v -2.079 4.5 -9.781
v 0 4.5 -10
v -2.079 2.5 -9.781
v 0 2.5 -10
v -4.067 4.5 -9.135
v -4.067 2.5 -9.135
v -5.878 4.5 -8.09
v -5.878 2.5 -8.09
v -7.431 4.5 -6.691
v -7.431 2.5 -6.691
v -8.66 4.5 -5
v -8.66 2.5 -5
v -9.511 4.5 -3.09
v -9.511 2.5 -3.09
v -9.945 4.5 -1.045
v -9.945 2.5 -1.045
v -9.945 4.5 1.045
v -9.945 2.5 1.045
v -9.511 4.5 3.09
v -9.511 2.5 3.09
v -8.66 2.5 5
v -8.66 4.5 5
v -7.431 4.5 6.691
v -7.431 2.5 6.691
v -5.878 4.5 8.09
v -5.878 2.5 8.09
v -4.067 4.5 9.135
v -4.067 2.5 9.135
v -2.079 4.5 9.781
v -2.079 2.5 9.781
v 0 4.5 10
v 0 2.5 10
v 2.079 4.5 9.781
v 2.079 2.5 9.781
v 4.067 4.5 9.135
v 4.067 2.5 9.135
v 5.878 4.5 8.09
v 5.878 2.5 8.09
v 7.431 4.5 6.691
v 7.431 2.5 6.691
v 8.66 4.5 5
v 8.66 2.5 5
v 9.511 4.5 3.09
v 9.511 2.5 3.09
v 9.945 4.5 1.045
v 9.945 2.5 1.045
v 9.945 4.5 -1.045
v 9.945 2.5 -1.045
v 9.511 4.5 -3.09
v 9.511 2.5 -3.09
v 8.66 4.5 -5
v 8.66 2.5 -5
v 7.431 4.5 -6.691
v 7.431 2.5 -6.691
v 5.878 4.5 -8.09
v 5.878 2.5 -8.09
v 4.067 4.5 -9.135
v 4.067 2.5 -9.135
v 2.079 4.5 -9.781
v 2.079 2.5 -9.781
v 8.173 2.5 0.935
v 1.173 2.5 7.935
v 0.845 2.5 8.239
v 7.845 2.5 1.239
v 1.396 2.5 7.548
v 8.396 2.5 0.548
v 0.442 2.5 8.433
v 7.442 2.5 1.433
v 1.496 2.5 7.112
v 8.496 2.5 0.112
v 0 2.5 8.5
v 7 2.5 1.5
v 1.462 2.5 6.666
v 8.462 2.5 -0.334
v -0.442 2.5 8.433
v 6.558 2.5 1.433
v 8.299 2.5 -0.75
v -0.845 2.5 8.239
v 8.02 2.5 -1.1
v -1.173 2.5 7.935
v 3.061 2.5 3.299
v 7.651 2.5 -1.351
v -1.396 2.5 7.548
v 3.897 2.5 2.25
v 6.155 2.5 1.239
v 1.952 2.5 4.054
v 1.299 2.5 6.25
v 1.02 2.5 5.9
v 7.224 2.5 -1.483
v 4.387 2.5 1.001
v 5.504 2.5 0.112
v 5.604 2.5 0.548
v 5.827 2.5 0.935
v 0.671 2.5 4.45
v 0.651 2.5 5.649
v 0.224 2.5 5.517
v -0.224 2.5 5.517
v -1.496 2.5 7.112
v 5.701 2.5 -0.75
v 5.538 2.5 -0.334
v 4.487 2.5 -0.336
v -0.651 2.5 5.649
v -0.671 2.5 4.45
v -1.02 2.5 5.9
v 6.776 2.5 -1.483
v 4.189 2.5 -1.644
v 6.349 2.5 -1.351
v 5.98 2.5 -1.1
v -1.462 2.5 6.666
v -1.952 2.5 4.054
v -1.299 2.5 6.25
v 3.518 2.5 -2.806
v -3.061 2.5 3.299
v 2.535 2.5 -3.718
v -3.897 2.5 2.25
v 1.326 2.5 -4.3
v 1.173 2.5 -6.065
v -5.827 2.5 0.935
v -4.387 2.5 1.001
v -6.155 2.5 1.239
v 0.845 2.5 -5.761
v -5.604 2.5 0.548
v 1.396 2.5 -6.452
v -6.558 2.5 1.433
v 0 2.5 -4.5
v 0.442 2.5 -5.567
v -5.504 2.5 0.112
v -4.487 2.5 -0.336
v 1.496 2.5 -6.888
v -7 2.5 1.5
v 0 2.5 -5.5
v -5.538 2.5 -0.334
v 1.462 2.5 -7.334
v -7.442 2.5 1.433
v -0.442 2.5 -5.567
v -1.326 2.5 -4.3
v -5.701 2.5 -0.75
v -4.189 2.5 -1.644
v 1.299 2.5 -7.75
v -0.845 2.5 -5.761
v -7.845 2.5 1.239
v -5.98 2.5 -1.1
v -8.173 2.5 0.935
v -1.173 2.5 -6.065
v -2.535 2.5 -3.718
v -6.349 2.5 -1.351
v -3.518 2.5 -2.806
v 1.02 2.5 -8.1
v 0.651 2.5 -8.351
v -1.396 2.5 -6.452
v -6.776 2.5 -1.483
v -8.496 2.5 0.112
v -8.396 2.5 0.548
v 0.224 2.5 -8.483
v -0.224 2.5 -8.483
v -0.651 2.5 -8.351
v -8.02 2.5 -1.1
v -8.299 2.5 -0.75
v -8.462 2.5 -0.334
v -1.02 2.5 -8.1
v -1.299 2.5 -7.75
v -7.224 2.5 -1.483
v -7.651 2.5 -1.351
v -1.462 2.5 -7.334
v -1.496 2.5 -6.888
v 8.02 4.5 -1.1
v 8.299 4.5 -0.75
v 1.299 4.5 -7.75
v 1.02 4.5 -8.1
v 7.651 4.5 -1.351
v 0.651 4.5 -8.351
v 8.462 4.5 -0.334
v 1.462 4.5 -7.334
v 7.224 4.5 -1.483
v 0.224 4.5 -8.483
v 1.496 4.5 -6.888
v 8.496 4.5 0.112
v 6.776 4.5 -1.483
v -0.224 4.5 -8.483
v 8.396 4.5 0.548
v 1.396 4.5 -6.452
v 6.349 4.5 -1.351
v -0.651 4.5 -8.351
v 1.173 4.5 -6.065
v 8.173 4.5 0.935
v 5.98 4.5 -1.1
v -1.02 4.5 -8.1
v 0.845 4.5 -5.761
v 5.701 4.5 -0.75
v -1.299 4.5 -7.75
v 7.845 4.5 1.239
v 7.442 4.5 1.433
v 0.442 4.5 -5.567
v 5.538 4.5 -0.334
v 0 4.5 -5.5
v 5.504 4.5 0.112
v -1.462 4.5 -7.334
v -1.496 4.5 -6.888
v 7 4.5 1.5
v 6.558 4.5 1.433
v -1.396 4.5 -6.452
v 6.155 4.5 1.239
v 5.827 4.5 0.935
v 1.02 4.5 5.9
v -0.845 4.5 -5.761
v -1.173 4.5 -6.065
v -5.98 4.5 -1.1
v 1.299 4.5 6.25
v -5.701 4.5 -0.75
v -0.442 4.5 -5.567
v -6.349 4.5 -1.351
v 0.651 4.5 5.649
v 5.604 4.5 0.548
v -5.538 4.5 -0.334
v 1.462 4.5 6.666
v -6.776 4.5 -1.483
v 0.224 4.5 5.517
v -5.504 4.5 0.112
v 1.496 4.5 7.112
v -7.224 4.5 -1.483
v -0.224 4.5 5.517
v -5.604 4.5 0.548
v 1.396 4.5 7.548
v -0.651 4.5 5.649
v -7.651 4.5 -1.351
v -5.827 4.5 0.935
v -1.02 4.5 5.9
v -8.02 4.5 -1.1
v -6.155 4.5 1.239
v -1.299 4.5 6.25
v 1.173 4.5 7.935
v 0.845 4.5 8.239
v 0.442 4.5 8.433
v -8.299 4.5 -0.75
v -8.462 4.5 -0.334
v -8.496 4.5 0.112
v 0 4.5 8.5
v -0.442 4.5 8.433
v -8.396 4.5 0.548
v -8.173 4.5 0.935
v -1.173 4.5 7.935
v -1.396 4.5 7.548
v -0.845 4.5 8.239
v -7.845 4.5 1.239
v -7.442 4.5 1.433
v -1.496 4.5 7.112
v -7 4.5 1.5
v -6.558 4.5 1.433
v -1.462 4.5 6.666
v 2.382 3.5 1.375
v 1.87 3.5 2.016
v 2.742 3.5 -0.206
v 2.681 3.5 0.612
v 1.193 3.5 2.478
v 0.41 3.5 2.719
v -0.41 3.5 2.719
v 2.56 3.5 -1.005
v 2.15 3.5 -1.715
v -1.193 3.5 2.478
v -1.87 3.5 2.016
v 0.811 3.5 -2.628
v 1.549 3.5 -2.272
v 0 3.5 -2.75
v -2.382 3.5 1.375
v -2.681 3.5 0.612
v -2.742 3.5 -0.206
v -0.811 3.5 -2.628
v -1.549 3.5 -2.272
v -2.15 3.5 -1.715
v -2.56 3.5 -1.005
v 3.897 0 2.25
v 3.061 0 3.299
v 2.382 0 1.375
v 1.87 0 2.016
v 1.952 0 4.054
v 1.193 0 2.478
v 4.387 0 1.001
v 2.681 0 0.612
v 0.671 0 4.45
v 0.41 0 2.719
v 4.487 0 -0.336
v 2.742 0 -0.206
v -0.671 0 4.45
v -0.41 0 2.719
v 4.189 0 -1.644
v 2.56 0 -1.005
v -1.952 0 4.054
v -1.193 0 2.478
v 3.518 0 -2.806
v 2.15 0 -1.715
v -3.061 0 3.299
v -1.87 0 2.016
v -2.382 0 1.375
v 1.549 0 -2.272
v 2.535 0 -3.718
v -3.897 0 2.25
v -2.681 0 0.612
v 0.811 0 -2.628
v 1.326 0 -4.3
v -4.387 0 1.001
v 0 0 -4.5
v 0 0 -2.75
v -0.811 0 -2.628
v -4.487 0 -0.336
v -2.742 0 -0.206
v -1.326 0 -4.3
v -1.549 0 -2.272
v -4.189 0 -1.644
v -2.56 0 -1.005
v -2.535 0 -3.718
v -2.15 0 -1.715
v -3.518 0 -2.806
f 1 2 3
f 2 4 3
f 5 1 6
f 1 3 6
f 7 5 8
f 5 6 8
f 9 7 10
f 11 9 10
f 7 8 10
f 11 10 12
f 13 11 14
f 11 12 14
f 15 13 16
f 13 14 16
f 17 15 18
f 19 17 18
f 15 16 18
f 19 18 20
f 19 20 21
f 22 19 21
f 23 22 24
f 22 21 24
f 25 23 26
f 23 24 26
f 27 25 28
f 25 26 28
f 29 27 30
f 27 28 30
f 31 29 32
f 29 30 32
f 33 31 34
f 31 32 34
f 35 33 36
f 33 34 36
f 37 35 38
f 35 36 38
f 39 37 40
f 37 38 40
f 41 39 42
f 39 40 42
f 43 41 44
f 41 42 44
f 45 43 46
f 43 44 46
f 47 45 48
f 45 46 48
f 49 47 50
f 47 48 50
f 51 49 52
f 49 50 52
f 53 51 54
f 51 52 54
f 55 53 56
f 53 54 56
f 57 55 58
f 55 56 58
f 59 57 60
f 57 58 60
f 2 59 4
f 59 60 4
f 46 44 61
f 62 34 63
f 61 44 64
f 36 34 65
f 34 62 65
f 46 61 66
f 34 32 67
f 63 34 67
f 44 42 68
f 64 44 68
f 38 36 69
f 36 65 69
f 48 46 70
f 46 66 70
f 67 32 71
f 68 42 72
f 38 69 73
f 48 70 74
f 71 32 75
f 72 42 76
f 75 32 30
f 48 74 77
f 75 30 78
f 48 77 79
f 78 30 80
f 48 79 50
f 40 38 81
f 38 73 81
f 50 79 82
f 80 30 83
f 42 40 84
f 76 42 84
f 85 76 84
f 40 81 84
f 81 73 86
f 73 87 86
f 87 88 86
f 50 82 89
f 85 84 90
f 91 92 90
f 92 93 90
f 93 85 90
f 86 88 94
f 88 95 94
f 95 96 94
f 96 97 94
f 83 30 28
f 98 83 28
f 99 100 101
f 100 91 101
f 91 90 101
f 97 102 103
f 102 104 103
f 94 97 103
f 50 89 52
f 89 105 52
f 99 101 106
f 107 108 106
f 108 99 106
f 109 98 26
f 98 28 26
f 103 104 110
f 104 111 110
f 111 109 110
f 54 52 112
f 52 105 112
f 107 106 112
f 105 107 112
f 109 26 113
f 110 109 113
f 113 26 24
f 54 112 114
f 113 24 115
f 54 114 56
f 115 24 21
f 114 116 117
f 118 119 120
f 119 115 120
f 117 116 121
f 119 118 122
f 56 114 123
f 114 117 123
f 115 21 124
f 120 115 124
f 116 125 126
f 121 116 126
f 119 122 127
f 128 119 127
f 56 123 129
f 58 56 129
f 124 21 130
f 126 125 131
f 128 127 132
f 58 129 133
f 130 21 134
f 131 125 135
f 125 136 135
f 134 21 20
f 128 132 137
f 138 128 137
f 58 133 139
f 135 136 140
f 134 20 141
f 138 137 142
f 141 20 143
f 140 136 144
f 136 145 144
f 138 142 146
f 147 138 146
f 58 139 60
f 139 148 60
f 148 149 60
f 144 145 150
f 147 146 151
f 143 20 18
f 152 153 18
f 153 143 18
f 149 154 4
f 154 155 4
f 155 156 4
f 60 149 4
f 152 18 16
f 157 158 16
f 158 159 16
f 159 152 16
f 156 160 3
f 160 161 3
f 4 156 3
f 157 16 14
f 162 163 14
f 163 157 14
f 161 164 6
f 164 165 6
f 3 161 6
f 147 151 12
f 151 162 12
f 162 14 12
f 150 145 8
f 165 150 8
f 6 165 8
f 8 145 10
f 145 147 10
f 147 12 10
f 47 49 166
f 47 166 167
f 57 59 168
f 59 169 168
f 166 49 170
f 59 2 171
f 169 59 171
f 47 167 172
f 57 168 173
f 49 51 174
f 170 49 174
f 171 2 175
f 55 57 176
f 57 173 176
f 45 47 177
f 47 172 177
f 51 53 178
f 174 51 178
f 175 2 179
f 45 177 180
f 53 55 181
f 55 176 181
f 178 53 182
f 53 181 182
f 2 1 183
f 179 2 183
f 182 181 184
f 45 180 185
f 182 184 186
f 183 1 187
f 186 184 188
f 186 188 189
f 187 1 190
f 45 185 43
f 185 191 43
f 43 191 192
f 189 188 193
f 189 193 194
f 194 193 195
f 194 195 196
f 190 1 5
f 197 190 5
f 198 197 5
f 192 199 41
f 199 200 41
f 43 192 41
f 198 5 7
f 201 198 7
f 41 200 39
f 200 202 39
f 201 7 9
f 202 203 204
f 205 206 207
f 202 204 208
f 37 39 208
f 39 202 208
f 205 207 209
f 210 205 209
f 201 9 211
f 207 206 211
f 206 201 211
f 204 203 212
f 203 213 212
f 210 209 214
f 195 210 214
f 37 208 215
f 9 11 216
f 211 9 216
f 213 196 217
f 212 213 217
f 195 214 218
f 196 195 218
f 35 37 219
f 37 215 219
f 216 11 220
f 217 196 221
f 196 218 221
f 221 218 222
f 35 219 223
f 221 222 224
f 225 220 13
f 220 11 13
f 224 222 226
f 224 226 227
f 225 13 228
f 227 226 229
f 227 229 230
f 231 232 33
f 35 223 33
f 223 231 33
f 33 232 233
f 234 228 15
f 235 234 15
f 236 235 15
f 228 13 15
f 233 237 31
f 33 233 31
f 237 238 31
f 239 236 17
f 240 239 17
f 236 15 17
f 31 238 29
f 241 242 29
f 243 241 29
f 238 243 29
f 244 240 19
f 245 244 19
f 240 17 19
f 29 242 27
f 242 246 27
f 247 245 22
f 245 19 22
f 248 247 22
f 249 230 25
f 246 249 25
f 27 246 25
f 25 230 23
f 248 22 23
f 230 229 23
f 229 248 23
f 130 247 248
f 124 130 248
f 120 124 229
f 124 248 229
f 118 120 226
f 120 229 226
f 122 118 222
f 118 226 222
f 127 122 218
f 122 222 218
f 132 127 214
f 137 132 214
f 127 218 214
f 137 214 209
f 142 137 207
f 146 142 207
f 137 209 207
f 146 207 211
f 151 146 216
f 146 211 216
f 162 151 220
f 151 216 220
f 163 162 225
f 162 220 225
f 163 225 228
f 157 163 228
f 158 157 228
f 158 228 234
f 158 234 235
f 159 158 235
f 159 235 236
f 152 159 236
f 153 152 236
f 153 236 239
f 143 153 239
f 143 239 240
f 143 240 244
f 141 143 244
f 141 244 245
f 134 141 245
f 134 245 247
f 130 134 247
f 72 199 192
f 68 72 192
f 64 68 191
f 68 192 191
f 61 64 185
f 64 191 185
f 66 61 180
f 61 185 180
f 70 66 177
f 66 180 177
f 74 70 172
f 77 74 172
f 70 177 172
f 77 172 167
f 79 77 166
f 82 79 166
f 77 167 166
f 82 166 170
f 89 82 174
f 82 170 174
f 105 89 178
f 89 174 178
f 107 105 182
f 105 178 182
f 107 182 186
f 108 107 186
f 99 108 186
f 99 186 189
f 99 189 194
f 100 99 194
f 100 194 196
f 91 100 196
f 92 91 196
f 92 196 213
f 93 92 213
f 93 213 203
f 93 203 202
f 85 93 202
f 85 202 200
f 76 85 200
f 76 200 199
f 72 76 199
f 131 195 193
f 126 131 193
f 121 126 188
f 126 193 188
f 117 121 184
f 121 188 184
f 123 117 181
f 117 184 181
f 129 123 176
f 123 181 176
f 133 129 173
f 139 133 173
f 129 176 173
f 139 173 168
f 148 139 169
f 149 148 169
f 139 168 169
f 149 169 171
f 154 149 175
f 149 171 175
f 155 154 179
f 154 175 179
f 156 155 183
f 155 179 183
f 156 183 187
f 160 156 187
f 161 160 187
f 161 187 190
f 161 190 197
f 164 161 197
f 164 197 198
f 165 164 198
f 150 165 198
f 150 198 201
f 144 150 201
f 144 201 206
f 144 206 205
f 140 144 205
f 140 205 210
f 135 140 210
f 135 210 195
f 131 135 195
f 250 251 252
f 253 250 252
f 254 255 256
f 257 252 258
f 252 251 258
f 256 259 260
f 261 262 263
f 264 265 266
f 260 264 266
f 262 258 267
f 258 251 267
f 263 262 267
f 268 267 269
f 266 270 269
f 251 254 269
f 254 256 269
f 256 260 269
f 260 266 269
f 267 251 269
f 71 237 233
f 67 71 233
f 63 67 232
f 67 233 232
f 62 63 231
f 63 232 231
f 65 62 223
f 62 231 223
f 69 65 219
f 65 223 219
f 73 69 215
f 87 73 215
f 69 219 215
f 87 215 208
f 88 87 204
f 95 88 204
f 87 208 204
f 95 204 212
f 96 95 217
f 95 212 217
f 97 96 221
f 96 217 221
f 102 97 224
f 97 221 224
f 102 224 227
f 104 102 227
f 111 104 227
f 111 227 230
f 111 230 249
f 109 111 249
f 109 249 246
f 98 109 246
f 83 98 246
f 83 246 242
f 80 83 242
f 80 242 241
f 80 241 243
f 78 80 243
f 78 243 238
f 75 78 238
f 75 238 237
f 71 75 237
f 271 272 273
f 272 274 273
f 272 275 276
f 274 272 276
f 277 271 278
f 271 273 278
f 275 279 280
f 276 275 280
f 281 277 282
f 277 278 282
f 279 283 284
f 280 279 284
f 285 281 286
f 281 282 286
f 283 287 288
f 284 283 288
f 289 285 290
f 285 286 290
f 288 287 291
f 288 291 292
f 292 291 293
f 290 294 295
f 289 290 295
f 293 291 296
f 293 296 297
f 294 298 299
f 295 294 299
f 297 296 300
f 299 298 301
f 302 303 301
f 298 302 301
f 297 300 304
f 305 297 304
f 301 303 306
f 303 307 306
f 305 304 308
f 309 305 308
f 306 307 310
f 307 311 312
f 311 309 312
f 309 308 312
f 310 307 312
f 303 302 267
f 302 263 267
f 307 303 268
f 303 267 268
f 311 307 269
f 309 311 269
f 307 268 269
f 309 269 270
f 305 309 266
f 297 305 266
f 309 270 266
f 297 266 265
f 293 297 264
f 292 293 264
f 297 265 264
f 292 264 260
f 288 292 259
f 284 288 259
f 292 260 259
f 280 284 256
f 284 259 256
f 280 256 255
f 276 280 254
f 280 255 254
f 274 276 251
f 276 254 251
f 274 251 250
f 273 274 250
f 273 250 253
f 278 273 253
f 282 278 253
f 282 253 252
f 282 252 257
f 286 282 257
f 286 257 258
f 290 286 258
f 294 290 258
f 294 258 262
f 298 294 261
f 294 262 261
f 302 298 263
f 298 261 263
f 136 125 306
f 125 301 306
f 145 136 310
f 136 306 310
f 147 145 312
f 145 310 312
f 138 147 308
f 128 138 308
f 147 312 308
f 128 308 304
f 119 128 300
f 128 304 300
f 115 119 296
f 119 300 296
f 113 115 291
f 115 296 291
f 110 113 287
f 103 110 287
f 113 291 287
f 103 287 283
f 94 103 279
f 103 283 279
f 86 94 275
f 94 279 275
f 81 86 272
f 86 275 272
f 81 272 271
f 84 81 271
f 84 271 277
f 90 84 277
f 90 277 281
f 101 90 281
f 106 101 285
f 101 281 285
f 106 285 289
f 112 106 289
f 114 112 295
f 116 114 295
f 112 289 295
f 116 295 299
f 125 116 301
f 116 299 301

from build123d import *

# Parameters (mm, degrees)
CUT_EXTRUDE_1_REACH = 16.841
SKETCH_2_R          = 1.5


with BuildPart() as part:
    # 草图1 → 旋转1 (revolve)
    with BuildSketch(Plane.XY, mode=Mode.PRIVATE) as revolve_1_sk:
        Polygon((0, 4.5), (-10, 4.5), (-10, 2.5), (-4.5, 2.5), (-4.5, 0), (-2.75, 0), (-2.75, 3.5), (0, 3.5), align=None)
    revolve(revolve_1_sk.sketch.rotate(Axis((0, 0, 0), (0, 1, 0)), 270), axis=Axis((0, 0, 0), (0, 1, 0)))

    # 草图2 → 切除-拉伸1 (cut, up to next)
    with BuildSketch(Plane(origin=(0, 4.5, 0), x_dir=(1, 0, 0), z_dir=(0, 1, 0)), mode=Mode.PRIVATE) as cut_extrude_1_sk1:
        with Locations(Location((0, 7, 0), (0, 0, 270))):
            Circle(SKETCH_2_R)
    cut_extrude_1_tool1 = extrude(cut_extrude_1_sk1.sketch, amount=-CUT_EXTRUDE_1_REACH, mode=Mode.PRIVATE) & part.part
    # 草图2 → 切除-拉伸1 (cut, up to next)
    with BuildSketch(Plane(origin=(0, 4.5, 0), x_dir=(1, 0, 0), z_dir=(0, 1, 0)), mode=Mode.PRIVATE) as cut_extrude_1_sk2:
        with Locations(Location((7, 0, 0), (0, 0, 270))):
            Circle(SKETCH_2_R)
    cut_extrude_1_tool2 = extrude(cut_extrude_1_sk2.sketch, amount=-CUT_EXTRUDE_1_REACH, mode=Mode.PRIVATE) & part.part
    # 草图2 → 切除-拉伸1 (cut, up to next)
    with BuildSketch(Plane(origin=(0, 4.5, 0), x_dir=(1, 0, 0), z_dir=(0, 1, 0)), mode=Mode.PRIVATE) as cut_extrude_1_sk3:
        with Locations(Location((0, -7, 0), (0, 0, 270))):
            Circle(SKETCH_2_R)
    cut_extrude_1_tool3 = extrude(cut_extrude_1_sk3.sketch, amount=-CUT_EXTRUDE_1_REACH, mode=Mode.PRIVATE) & part.part
    # 草图2 → 切除-拉伸1 (cut, up to next)
    with BuildSketch(Plane(origin=(0, 4.5, 0), x_dir=(1, 0, 0), z_dir=(0, 1, 0)), mode=Mode.PRIVATE) as cut_extrude_1_sk4:
        with Locations(Location((-7, 0, 0), (0, 0, 270))):
            Circle(SKETCH_2_R)
    cut_extrude_1_tool4 = extrude(cut_extrude_1_sk4.sketch, amount=-CUT_EXTRUDE_1_REACH, mode=Mode.PRIVATE) & part.part
    add(cut_extrude_1_tool1.solids().sort_by_distance((0, 4.5, -7))[0], mode=Mode.SUBTRACT)
    add(cut_extrude_1_tool2.solids().sort_by_distance((7, 4.5, 0))[0], mode=Mode.SUBTRACT)
    add(cut_extrude_1_tool3.solids().sort_by_distance((0, 4.5, 7))[0], mode=Mode.SUBTRACT)
    add(cut_extrude_1_tool4.solids().sort_by_distance((-7, 4.5, 0))[0], mode=Mode.SUBTRACT)


solid = part.part
